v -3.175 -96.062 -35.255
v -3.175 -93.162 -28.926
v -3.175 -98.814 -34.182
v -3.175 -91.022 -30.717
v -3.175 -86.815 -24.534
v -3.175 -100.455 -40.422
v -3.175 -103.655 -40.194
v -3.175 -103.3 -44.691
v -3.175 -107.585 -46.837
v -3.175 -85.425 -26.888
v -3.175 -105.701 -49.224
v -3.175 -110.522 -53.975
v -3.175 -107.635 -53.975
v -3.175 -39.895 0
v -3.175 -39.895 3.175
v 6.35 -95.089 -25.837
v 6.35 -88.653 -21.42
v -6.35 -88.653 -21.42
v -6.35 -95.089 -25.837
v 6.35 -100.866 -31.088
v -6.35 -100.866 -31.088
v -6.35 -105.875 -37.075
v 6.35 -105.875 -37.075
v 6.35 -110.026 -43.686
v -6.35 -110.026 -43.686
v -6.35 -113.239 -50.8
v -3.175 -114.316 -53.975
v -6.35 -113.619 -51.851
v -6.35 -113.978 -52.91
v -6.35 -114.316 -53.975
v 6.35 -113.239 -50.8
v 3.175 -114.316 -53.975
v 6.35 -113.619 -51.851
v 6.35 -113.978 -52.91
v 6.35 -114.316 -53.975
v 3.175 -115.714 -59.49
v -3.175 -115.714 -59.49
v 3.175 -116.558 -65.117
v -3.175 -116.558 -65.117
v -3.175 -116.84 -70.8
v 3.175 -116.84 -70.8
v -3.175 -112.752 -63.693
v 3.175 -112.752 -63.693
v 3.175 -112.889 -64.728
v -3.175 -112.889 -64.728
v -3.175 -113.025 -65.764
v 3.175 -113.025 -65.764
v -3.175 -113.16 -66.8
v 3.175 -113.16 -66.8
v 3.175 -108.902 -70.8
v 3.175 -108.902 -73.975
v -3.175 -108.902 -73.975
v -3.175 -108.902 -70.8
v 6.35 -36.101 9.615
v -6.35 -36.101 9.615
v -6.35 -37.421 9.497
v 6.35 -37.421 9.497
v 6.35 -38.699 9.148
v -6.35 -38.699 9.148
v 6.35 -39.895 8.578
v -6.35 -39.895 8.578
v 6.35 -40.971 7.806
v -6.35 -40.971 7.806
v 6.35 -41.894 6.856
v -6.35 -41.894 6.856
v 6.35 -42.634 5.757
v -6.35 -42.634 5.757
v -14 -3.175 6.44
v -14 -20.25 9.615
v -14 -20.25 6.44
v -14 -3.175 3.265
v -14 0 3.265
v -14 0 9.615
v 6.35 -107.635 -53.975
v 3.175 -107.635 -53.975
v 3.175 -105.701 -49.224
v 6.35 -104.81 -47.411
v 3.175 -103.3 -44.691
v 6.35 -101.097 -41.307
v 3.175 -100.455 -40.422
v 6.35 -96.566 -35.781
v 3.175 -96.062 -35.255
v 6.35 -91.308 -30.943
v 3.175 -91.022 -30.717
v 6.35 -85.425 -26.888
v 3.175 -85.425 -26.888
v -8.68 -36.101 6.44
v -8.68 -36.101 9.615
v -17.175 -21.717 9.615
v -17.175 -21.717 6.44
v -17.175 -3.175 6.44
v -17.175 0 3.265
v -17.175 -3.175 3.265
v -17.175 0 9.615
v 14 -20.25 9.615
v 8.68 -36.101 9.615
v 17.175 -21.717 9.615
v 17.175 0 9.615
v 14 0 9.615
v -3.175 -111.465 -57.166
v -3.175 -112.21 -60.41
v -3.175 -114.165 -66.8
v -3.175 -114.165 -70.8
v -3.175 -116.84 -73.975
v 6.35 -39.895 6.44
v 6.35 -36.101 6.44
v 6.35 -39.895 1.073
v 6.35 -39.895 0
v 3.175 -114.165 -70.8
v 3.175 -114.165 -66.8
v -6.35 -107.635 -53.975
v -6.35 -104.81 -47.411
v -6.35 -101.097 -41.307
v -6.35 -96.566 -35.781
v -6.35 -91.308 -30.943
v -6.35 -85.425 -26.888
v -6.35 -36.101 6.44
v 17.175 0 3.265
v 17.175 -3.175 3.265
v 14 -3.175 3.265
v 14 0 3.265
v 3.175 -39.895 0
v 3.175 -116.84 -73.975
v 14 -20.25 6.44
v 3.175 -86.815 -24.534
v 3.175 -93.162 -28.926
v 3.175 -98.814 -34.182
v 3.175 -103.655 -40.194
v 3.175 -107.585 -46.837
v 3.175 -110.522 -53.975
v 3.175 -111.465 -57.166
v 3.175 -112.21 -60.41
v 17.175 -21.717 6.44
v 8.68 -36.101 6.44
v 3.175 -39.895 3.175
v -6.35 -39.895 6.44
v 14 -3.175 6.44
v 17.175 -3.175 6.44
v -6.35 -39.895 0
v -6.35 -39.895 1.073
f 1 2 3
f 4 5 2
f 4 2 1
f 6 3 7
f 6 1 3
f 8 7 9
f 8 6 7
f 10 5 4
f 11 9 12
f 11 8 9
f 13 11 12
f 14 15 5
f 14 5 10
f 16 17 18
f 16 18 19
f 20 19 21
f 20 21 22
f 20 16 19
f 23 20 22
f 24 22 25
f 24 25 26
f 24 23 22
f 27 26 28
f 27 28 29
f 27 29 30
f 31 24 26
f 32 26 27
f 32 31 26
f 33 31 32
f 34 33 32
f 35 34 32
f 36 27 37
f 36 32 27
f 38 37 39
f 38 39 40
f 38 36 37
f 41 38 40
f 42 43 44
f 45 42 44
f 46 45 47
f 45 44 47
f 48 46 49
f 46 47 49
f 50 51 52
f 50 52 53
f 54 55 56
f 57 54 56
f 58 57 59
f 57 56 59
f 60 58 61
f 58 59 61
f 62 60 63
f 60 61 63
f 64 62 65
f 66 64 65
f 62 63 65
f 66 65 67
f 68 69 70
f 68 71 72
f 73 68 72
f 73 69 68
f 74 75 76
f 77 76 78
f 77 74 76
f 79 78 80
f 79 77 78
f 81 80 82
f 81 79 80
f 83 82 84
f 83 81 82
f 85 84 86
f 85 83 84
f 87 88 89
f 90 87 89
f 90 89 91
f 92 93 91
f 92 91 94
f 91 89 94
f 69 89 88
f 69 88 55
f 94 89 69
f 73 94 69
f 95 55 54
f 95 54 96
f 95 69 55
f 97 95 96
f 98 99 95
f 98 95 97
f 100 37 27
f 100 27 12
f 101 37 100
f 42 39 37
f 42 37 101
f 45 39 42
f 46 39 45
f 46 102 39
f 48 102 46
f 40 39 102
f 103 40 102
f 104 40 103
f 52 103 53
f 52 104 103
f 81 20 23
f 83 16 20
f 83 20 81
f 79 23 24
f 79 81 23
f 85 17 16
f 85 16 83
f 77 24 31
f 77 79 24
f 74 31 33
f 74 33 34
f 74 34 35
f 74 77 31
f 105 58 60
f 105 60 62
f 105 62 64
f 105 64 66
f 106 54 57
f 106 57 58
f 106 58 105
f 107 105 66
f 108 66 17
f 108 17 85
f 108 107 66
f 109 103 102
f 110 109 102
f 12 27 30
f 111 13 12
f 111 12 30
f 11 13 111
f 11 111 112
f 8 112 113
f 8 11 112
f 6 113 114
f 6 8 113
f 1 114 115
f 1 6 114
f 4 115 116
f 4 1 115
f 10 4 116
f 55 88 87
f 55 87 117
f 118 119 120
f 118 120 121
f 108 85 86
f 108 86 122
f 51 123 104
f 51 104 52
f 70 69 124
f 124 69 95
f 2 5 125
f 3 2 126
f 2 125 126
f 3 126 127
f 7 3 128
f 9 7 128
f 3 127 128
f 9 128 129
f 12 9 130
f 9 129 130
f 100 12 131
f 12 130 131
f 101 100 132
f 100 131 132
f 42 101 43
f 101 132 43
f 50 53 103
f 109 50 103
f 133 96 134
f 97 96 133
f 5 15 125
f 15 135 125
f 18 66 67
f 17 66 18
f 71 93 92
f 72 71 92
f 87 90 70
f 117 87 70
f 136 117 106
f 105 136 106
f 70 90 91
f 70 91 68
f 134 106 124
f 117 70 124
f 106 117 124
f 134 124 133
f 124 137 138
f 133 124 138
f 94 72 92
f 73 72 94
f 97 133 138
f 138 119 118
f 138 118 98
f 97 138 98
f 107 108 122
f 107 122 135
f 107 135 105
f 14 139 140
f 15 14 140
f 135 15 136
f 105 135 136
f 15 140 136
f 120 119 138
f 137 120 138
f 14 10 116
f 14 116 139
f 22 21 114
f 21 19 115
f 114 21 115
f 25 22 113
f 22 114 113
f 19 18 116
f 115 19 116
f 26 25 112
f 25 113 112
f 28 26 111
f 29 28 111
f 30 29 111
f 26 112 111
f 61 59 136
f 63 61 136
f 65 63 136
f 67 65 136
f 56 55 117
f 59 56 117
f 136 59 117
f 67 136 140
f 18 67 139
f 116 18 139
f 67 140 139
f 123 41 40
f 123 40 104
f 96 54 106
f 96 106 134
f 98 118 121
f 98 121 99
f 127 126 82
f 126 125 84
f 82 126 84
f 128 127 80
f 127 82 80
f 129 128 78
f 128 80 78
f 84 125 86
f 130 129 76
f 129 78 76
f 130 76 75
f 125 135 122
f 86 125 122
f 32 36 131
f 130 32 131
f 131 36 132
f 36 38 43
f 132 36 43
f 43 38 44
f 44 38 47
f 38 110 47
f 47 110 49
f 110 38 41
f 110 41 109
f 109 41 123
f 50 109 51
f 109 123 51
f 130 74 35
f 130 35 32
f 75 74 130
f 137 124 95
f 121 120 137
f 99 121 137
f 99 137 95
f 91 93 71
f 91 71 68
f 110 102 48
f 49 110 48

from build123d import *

# Parameters (mm, degrees)
SKETCH5_W           = 12.880016042
SKETCH5_H           = 15.834691301
CUT_EXTRUDE2_DEPTH  = 7.62
CUT_EXTRUDE6_REACH  = 62
SKETCH11_W          = 3.175
SKETCH11_H          = 3.175
BOSS_EXTRUDE1_DEPTH = 6.35
CUT_EXTRUDE4_DEPTH  = 3.175
SKETCH10_W          = 4
SKETCH10_H          = 0.5
CUT_EXTRUDE5_DEPTH  = 37.349999944
CUT_EXTRUDE7_DEPTH  = 40.64
BOSS_EXTRUDE3_DEPTH = 12.7
SKETCH19_W          = 21.319602533
SKETCH19_H          = 36.10119369
CUT_EXTRUDE10_DEPTH = 13.7
SKETCH21_W          = 9.2375
SKETCH21_H          = 32.92619369
SKETCH21_H_2        = 3.175
BOSS_EXTRUDE4_DEPTH = 3.175
SKETCH15_W          = 6.35
SKETCH15_H          = 3.175
BOSS_EXTRUDE2_DEPTH = 1.5875
SKETCH17_W          = 3.175
SKETCH17_H          = 46.222237063
CUT_EXTRUDE9_DEPTH  = 20
SKETCH22_W          = 28
SKETCH22_H          = 20.25
CUT_EXTRUDE11_DEPTH = 84.59000802
SKETCH23_W          = 1.5875
SKETCH23_H          = 32.92619369
BOSS_EXTRUDE5_DEPTH = 3.175
CUT_EXTRUDE12_DEPTH = 104.974999944


with BuildPart() as part:
    # Sketch2 → Revolve1 (revolve)
    with BuildSketch(Plane(origin=(0, 0, 0), x_dir=(0, 0, -1), z_dir=(1, 0, 0))):
        Polygon((0, -50.8), (-29.999999944, 0), (0, 0), align=None)
    revolve(axis=Axis((0, 0, 0), (0, -1, 0)))

    # Sketch4 → Cut-Revolve1 (revolve, cut)
    with BuildSketch(Plane(origin=(0, 0, 0), x_dir=(0, 0, -1), z_dir=(1, 0, 0))):
        Polygon((0, -45.72), (-24.919999944, 0), (0, 0), align=None)
    revolve(axis=Axis((0, 16.11457811, 0), (0, -1, 0)), mode=Mode.SUBTRACT)

    # Sketch5 → Cut-Extrude2 (cut, symmetric)
    with BuildSketch(Plane(origin=(0, 0, 0), x_dir=(0, 0, -1), z_dir=(1, 0, 0))):
        with Locations((0, -47.812265381)):
            Rectangle(SKETCH5_W, SKETCH5_H)
    extrude(amount=CUT_EXTRUDE2_DEPTH, both=True, mode=Mode.SUBTRACT)

    # Sketch11 → Cut-Extrude6 (cut, up to next)
    with BuildSketch(Plane.XY.offset(29.999999944), mode=Mode.PRIVATE) as cut_extrude6_sk1:
        with Locations((4.7625, -1.5875)):
            Rectangle(SKETCH11_W, SKETCH11_H)
    cut_extrude6_tool1 = extrude(cut_extrude6_sk1.sketch, amount=-CUT_EXTRUDE6_REACH, mode=Mode.PRIVATE) & part.part
    add(cut_extrude6_tool1.solids().sort_by_distance((4.7625, -1.5875, 30))[0], mode=Mode.SUBTRACT)
    # Sketch11 → Cut-Extrude6 (cut, up to next)
    with BuildSketch(Plane.XY.offset(29.999999944), mode=Mode.PRIVATE) as cut_extrude6_sk2:
        with Locations((-4.7625, -1.5875)):
            Rectangle(SKETCH11_W, SKETCH11_H)
    cut_extrude6_tool2 = extrude(cut_extrude6_sk2.sketch, amount=-CUT_EXTRUDE6_REACH, mode=Mode.PRIVATE) & part.part
    add(cut_extrude6_tool2.solids().sort_by_distance((-4.7625, -1.5875, 30))[0], mode=Mode.SUBTRACT)

    # Sketch6 → Boss-Extrude1 (add, symmetric)
    with BuildSketch(Plane(origin=(0, 0, 0), x_dir=(0, 0, -1), z_dir=(1, 0, 0))):
        with BuildLine():
            Line((0, -39.89491973), (-7.374618631, -39.89491973))
            Line((-7.374618631, -39.89491973), (21.419811292, -88.653487823))
            ThreePointArc((21.419811292, -88.653487823), (33.996187642, -103.472377364), (50.8, -113.239496671))
            ThreePointArc((50.8, -113.239496671), (60.639246777, -115.932696949), (70.8, -116.84))
            Line((70.8, -116.84), (73.975, -116.84))
            Line((73.975, -116.84), (73.975, -108.9025))
            Line((73.975, -108.9025), (70.8, -108.9025))
            Line((70.8, -108.9025), (70.8, -110.49))
            ThreePointArc((70.8, -110.49), (45.518672683, -103.782529931), (26.887551662, -85.424507296))
            Line((26.887551662, -85.424507296), (0, -39.89491973))
        make_face()
        Polygon((-30.934610553, 0), (-7.374618631, -39.89491973), (0, -39.89491973), (-23.559991923, 0), align=None)
    extrude(amount=BOSS_EXTRUDE1_DEPTH, both=True)

    # Sketch7 → Cut-Extrude4 (cut)
    with BuildSketch(Plane(origin=(0, 0, 0), x_dir=(0, 0, -1), z_dir=(1, 0, 0))):
        with BuildLine():
            Line((-3.175, -39.89491973), (24.533521366, -86.814682665))
            ThreePointArc((24.533521366, -86.814682665), (41.129063901, -104.288765008), (63.693035948, -112.75178759))
            ThreePointArc((63.693035948, -112.75178759), (67.245408265, -113.217029966), (70.8, -113.665))
            Line((70.8, -113.665), (70.8, -110.49))
            ThreePointArc((70.8, -110.49), (54.803942003, -107.916398221), (40.422357136, -100.455345061))
            ThreePointArc((40.422357136, -100.455345061), (32.902296459, -93.617671422), (26.887551662, -85.424507296))
            Line((26.887551662, -85.424507296), (-23.559991923, 0))
            Line((-23.559991923, 0), (-26.734991923, 0))
            Line((-26.734991923, 0), (-3.175, -39.89491973))
        make_face()
    cut_extrude4 = extrude(amount=-CUT_EXTRUDE4_DEPTH, mode=Mode.SUBTRACT)

    # Mirror1: Cut-Extrude4 across plane
    add(cut_extrude4.mirror(Plane(origin=(0, 0, 0), x_dir=(0, 0, 1), z_dir=(1, 0, 0))), mode=Mode.SUBTRACT)

    # Sketch9 → Cut-Revolve2 (revolve, cut)
    with BuildSketch(Plane(origin=(0, 0, 0), x_dir=(0, 0, -1), z_dir=(1, 0, 0))):
        Polygon((0, 0), (-24.9199908, 0), (-0.536470716, -39.89491973), (0, -39.89491973), align=None)
    revolve(axis=Axis((0, 16.11457811, 0), (0, -1, 0)), mode=Mode.SUBTRACT)

    # Sketch10 → Cut-Extrude5 (cut, through all)
    with BuildSketch(Plane.ZY.offset(6.35)):
        with BuildLine():
            Line((-66.8, -113.665), (-66.8, -110.332889222))
            ThreePointArc((-66.8, -110.332889222), (-68.798457857, -110.450707168), (-70.8, -110.49))
            Line((-70.8, -110.49), (-70.8, -113.665))
            Line((-70.8, -113.665), (-66.8, -113.665))
        make_face()
        with Locations((-68.8, -113.915)):
            Rectangle(SKETCH10_W, SKETCH10_H)
    extrude(amount=-CUT_EXTRUDE5_DEPTH, mode=Mode.SUBTRACT)

    # Sketch12 → Cut-Extrude7 (cut, symmetric)
    with BuildSketch(Plane.ZY):
        Polygon((30, 0), (-61.025869449, 0), (-61.025869449, -39.89491973), (-6.440008021, -39.89491973), (6.44000802, -39.89491973), (27.945214206, -3.175), align=None)
    extrude(amount=CUT_EXTRUDE7_DEPTH, both=True, mode=Mode.SUBTRACT)

    # Sketch18 → Boss-Extrude3 (add)
    with BuildSketch(Plane.ZY.offset(6.35)):
        with BuildLine():
            Line((6.44000802, -39.89491973), (6.44000802, 0))
            Line((6.44000802, 0), (9.61500802, 0))
            Line((9.61500802, 0), (9.61500802, -34.473639686))
            Line((9.61500802, -34.473639686), (9.61500802, -36.10119369))
            ThreePointArc((9.61500802, -36.10119369), (8.57844205, -39.89491973), (5.756782033, -42.634456374))
            Line((5.756782033, -42.634456374), (6.44000802, -41.477527034))
            Line((6.44000802, -41.477527034), (6.44000802, -39.89491973))
        make_face()
    extrude(amount=-BOSS_EXTRUDE3_DEPTH)

    # Sketch19 → Cut-Extrude10 (cut, through all)
    with BuildSketch(Plane.ZY.offset(6.35)):
        with Locations((20.274809287, -18.050596845)):
            Rectangle(SKETCH19_W, SKETCH19_H)
    extrude(amount=-CUT_EXTRUDE10_DEPTH, mode=Mode.SUBTRACT)

    # Sketch21 → Boss-Extrude4 (add)
    with BuildSketch(Plane.XY.offset(9.61500802)):
        with Locations((-10.96875, -19.638096845)):
            Rectangle(SKETCH21_W, SKETCH21_H)
        with Locations((10.96875, -19.638096845)):
            Rectangle(SKETCH21_W, SKETCH21_H)
        with Locations((10.96875, -1.5875)):
            Rectangle(SKETCH21_W, SKETCH21_H_2)
        with Locations((-10.96875, -1.5875)):
            Rectangle(SKETCH21_W, SKETCH21_H_2)
    extrude(amount=-BOSS_EXTRUDE4_DEPTH)

    # Sketch15 → Boss-Extrude2 (add, symmetric)
    with BuildSketch(Plane.ZY.offset(15.5875)):
        with Locations((6.44000802, -1.5875)):
            Rectangle(SKETCH15_W, SKETCH15_H)
    boss_extrude2 = extrude(amount=BOSS_EXTRUDE2_DEPTH, both=True)

    # Mirror2: Boss-Extrude2 across plane
    add(boss_extrude2.mirror(Plane(origin=(0, 0, 0), x_dir=(0, 0, 1), z_dir=(1, 0, 0))))

    # Sketch17 → Cut-Extrude9 (cut)
    with BuildSketch(Plane(origin=(0, 0, -73.975), x_dir=(-1, 0, 0), z_dir=(0, 0, -1))):
        with Locations((-4.7625, -93.728881469)):
            Rectangle(SKETCH17_W, SKETCH17_H)
        with Locations((4.7625, -93.728881469)):
            Rectangle(SKETCH17_W, SKETCH17_H)
    extrude(amount=-CUT_EXTRUDE9_DEPTH, mode=Mode.SUBTRACT)

    # Sketch22 → Cut-Extrude11 (cut, through all)
    with BuildSketch(Plane.XY.offset(9.61500802)):
        with Locations((0, -10.125)):
            Rectangle(SKETCH22_W, SKETCH22_H)
    extrude(amount=-CUT_EXTRUDE11_DEPTH, mode=Mode.SUBTRACT)

    # Sketch23 → Boss-Extrude5 (add)
    with BuildSketch(Plane.XY.offset(9.61500802)):
        with Locations((-16.38125, -19.638096845)):
            Rectangle(SKETCH23_W, SKETCH23_H)
        with Locations((16.38125, -19.638096845)):
            Rectangle(SKETCH23_W, SKETCH23_H)
    extrude(amount=-BOSS_EXTRUDE5_DEPTH)

    # Sketch24 → Cut-Extrude12 (cut, through all)
    with BuildSketch(Plane.XY.offset(29.999999944)):
        Polygon((-17.175, -36.10119369), (-8.68039741, -36.10119369), (-17.175, -21.71699995), align=None)
        Polygon((17.175, -21.71699995), (17.175, -36.10119369), (8.68039741, -36.10119369), align=None)
    extrude(amount=-CUT_EXTRUDE12_DEPTH, mode=Mode.SUBTRACT)


solid = part.part
